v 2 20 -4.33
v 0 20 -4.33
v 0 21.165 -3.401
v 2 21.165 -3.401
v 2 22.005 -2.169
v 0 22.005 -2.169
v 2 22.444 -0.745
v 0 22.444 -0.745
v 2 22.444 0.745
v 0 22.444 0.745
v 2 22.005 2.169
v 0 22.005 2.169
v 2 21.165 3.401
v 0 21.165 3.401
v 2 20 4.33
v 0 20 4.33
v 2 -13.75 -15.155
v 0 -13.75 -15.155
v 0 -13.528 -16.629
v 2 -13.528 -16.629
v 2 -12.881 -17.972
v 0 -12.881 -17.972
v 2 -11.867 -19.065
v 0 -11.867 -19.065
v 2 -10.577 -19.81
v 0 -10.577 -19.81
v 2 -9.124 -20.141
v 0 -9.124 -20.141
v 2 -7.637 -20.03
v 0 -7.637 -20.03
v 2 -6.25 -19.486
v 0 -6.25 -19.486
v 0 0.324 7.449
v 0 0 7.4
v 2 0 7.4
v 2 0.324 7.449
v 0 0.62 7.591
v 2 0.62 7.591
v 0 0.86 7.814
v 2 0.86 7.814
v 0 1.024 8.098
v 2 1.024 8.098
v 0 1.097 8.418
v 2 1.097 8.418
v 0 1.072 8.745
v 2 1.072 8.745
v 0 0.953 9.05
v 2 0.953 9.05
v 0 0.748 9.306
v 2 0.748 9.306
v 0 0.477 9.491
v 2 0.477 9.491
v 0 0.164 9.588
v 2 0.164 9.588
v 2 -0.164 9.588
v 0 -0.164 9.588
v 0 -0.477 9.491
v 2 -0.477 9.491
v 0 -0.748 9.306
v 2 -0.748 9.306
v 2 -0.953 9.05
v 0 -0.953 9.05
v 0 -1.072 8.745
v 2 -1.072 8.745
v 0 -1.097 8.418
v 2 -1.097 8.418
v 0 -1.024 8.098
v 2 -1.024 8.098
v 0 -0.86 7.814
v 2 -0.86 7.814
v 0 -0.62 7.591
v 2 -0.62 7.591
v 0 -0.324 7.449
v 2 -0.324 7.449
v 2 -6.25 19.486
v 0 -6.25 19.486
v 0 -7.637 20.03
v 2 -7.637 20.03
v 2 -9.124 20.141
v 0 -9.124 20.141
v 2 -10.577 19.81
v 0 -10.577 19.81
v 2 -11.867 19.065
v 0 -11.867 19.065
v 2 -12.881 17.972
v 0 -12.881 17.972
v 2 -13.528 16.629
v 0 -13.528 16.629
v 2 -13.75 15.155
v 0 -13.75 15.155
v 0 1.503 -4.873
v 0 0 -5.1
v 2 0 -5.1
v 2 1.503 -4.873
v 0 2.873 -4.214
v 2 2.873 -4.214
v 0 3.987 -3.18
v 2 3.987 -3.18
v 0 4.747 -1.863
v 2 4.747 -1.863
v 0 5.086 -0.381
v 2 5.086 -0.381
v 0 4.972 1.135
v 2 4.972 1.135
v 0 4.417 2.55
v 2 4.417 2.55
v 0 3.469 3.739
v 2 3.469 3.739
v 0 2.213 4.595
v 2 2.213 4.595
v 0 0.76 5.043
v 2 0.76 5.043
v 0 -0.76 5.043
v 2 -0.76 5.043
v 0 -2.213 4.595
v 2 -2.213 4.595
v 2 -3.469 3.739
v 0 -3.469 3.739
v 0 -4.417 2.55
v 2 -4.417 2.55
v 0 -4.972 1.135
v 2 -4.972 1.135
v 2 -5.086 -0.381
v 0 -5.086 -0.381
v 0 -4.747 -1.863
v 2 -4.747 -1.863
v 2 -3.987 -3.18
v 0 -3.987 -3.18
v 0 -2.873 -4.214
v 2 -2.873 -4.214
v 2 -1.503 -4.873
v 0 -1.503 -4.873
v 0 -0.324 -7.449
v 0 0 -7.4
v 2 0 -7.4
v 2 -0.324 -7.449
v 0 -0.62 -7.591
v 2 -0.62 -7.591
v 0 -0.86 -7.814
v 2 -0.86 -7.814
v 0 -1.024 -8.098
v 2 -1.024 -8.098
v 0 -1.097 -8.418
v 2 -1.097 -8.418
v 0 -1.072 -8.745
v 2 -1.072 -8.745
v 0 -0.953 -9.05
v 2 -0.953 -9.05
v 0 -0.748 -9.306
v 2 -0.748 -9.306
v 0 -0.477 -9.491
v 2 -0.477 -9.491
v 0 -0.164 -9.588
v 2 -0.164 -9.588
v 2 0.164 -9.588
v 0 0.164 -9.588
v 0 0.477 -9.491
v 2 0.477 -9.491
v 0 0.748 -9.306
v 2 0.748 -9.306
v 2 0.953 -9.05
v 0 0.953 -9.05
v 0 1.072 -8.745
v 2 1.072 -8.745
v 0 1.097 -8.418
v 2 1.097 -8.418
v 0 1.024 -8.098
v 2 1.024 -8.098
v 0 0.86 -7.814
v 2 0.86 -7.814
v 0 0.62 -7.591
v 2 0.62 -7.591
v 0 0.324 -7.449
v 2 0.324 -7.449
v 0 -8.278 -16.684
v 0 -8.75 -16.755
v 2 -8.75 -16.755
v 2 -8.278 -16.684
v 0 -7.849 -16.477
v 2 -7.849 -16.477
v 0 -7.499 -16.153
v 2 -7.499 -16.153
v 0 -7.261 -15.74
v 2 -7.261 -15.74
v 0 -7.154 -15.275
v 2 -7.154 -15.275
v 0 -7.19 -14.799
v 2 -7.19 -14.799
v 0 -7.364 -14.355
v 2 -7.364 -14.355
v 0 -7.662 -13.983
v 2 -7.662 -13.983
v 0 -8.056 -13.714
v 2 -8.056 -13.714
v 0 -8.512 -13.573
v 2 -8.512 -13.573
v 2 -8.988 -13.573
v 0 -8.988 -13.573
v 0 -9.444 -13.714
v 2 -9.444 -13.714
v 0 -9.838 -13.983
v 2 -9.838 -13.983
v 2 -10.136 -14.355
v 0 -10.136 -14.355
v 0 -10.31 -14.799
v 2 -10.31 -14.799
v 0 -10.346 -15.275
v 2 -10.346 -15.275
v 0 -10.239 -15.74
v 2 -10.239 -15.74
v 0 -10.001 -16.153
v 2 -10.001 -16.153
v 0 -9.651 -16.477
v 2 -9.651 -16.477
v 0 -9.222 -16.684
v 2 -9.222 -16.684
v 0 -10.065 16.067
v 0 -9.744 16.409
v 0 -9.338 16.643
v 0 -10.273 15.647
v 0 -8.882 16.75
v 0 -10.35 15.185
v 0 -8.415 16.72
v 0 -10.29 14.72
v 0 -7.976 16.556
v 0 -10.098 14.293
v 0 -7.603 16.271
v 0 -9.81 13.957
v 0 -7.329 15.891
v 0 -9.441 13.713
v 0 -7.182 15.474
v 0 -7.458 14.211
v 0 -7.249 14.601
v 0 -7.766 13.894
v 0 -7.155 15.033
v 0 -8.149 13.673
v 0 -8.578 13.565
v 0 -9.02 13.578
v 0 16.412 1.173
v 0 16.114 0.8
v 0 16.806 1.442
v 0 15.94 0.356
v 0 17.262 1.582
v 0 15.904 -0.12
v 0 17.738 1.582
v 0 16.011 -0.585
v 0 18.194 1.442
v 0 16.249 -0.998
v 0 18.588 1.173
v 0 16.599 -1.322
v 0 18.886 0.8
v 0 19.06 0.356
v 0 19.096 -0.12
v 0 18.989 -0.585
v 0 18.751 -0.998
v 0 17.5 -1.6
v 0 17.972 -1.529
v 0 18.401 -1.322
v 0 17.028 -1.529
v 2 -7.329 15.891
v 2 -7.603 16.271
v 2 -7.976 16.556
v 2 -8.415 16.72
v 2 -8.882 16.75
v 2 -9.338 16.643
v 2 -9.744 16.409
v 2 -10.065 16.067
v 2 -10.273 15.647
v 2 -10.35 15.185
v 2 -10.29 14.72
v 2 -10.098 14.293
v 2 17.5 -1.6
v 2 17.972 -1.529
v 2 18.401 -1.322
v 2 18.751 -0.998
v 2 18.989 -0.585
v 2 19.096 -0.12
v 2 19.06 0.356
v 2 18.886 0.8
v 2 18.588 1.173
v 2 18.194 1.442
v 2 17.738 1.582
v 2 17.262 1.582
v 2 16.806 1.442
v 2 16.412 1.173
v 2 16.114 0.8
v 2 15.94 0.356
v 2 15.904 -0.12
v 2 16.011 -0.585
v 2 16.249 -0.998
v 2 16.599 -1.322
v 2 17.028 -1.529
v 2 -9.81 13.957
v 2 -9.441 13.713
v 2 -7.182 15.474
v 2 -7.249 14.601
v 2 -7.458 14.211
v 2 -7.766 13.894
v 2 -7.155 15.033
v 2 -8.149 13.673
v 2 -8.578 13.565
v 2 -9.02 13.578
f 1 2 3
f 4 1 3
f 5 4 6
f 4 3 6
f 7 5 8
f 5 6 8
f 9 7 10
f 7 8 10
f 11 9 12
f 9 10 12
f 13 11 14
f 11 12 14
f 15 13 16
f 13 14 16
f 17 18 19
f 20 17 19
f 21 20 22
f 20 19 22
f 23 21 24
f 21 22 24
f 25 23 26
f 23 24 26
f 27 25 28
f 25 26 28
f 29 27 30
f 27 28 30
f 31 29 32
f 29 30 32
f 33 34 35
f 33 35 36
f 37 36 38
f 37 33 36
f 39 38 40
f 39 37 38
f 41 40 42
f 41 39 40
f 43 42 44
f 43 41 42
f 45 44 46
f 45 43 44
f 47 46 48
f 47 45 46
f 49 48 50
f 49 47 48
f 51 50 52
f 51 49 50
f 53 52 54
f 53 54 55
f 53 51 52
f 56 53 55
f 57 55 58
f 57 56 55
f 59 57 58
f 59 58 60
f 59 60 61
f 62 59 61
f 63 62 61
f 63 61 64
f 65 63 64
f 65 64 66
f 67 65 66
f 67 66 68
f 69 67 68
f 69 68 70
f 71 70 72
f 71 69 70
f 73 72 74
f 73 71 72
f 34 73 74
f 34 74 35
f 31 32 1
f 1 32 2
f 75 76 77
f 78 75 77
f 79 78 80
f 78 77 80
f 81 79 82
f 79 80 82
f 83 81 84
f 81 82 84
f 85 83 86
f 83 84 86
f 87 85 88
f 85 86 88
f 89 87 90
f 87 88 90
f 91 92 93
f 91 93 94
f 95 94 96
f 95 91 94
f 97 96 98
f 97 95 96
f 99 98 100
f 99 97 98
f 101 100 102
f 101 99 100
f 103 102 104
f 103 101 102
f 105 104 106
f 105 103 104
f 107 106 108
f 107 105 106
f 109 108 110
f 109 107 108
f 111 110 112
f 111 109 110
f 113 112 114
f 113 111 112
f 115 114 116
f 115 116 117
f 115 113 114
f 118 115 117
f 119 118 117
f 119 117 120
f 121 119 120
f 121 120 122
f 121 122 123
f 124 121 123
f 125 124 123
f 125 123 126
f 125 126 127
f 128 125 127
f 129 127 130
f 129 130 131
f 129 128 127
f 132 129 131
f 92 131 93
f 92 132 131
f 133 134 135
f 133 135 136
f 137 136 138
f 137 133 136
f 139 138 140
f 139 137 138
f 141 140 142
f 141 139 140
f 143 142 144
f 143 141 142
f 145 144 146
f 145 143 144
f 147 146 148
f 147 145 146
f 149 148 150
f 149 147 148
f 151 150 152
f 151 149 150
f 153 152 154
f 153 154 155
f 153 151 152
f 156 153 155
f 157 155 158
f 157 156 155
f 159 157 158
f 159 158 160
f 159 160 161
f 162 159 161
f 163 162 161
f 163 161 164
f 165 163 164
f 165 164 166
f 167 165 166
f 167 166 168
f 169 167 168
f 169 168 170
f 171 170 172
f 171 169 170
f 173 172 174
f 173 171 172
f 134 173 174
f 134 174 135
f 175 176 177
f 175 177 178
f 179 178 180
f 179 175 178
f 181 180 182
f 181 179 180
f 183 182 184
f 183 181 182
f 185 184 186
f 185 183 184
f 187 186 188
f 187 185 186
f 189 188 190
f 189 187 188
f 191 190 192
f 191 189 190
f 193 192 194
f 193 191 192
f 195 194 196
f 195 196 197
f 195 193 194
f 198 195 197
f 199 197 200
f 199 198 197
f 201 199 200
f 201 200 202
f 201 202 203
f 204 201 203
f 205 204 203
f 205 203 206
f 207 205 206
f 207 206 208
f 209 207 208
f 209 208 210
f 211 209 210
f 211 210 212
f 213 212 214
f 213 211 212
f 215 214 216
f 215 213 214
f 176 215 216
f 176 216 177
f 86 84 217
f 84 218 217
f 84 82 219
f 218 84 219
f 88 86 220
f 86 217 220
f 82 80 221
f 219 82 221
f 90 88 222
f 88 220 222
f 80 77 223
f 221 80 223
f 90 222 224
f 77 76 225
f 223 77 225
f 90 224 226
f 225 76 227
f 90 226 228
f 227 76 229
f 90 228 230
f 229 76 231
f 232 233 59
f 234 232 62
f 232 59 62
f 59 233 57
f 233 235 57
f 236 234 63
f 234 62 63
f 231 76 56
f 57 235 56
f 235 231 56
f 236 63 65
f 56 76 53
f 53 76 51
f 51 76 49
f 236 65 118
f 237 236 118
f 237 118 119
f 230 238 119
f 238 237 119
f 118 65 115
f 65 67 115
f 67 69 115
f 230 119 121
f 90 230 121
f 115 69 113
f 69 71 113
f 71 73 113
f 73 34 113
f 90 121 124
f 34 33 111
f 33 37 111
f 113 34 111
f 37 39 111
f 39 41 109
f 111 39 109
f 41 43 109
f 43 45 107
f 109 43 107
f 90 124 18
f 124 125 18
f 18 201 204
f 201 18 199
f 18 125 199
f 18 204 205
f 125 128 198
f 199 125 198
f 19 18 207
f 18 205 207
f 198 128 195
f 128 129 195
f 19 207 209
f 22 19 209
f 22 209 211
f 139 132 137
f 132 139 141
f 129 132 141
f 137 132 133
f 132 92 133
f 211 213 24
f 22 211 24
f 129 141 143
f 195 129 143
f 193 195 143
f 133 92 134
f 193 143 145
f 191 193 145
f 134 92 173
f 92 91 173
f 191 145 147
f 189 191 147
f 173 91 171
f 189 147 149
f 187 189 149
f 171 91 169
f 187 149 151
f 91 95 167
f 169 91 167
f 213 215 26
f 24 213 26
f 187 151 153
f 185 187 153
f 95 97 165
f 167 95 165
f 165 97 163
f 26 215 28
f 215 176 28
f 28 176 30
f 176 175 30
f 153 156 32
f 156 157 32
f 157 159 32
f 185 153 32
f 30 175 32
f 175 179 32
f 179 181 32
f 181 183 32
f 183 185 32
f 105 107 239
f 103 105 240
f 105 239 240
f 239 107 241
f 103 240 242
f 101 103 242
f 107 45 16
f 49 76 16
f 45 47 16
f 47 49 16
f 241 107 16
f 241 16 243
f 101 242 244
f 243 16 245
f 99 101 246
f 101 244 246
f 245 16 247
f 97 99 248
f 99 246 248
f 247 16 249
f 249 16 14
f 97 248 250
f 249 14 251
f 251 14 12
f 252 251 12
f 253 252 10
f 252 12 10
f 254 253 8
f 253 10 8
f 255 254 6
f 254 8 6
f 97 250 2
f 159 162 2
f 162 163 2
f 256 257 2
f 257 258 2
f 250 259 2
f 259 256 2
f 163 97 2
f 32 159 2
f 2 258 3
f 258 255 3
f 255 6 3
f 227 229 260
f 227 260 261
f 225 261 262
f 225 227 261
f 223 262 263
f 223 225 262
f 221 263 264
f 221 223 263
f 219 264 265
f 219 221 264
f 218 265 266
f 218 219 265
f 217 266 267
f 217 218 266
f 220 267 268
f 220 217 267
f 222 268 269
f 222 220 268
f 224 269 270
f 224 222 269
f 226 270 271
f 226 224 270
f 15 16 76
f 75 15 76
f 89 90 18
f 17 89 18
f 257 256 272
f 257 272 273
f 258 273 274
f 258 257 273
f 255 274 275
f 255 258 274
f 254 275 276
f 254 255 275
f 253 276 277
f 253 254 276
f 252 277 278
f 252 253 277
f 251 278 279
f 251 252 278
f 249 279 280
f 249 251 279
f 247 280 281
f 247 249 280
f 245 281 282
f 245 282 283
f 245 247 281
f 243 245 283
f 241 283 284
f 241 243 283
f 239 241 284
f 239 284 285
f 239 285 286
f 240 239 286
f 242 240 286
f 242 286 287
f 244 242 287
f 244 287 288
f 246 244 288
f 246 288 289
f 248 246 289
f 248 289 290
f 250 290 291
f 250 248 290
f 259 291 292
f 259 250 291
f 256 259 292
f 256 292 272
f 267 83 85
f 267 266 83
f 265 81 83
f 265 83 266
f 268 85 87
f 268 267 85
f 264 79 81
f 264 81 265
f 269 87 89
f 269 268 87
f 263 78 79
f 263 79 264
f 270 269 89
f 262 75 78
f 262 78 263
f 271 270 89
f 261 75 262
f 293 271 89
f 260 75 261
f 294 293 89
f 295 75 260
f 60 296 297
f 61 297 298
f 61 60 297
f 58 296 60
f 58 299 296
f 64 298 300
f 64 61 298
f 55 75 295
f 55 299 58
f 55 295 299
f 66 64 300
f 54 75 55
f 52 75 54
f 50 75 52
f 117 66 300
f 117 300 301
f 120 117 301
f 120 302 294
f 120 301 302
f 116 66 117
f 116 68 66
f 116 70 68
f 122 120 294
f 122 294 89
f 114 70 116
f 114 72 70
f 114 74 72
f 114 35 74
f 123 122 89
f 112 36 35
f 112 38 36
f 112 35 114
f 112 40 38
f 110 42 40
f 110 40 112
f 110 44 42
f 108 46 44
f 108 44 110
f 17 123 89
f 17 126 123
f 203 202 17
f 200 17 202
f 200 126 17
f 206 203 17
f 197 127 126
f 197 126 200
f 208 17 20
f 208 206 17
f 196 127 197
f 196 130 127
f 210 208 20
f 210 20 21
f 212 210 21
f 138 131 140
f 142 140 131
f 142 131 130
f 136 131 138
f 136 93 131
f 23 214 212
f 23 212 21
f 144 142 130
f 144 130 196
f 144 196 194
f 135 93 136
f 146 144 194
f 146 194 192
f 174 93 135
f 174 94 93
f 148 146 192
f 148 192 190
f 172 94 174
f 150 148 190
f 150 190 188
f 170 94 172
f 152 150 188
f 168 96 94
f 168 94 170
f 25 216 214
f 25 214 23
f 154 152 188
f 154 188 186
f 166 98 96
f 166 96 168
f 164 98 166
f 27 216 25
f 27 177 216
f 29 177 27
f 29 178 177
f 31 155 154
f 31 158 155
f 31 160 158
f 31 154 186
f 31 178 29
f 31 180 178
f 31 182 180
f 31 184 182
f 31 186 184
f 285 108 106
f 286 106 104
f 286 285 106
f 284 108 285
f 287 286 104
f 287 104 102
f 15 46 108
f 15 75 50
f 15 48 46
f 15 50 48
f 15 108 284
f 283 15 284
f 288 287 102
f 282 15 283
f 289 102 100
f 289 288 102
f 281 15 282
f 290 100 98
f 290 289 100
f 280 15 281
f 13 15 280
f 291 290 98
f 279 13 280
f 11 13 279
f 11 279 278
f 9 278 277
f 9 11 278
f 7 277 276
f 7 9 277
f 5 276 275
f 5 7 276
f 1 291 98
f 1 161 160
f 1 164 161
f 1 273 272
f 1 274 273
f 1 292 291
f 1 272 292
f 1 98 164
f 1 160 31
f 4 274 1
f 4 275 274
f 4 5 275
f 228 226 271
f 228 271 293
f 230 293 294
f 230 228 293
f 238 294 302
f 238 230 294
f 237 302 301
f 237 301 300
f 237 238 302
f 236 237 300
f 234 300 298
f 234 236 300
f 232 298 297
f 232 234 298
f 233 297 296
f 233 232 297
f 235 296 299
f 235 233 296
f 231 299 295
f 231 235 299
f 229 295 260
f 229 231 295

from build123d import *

# Parameters (mm, degrees)
SKETCH_1_R      = 5.1
SKETCH_1_R_2    = 1.6
SKETCH_1_R_3    = 1.1
EXTRUDE_1_DEPTH = 2


with BuildPart() as part:
    # ｽｹｯﾁ1 → ﾎﾞｽ - 押し出し1 (new body)
    with BuildSketch(Plane(origin=(0, 0, 0), x_dir=(0, 0, -1), z_dir=(1, 0, 0))):
        with BuildLine():
            Line((-4.330127019, 20), (-19.485571585, -6.25))
            ThreePointArc((-19.485571585, -6.25), (-19.485571585, -11.25), (-15.155444566, -13.75))
            Line((-15.155444566, -13.75), (15.155444566, -13.75))
            ThreePointArc((15.155444566, -13.75), (19.485571585, -11.25), (19.485571585, -6.25))
            Line((19.485571585, -6.25), (4.330127019, 20))
            ThreePointArc((4.330127019, 20), (0, 22.5), (-4.330127019, 20))
        make_face()
        Circle(SKETCH_1_R, mode=Mode.SUBTRACT)
        with Locations((0, 17.5)):
            Circle(SKETCH_1_R_2, mode=Mode.SUBTRACT)
        with Locations((-8.5, 0)):
            Circle(SKETCH_1_R_3, mode=Mode.SUBTRACT)
        with Locations(Location((8.5, 0, 0), (0, 0, 180))):
            Circle(SKETCH_1_R_3, mode=Mode.SUBTRACT)
        with Locations((15.155444566, -8.75)):
            Circle(SKETCH_1_R_2, mode=Mode.SUBTRACT)
        with BuildLine():
            ThreePointArc((-15.891264638, -7.329236536), (-16.541085212, -9.55), (-14.292937349, -10.097620607))
            ThreePointArc((-14.292937349, -10.097620607), (-13.76980392, -7.95), (-15.891264638, -7.329236536))
        make_face(mode=Mode.SUBTRACT)
    extrude(amount=EXTRUDE_1_DEPTH)


solid = part.part
